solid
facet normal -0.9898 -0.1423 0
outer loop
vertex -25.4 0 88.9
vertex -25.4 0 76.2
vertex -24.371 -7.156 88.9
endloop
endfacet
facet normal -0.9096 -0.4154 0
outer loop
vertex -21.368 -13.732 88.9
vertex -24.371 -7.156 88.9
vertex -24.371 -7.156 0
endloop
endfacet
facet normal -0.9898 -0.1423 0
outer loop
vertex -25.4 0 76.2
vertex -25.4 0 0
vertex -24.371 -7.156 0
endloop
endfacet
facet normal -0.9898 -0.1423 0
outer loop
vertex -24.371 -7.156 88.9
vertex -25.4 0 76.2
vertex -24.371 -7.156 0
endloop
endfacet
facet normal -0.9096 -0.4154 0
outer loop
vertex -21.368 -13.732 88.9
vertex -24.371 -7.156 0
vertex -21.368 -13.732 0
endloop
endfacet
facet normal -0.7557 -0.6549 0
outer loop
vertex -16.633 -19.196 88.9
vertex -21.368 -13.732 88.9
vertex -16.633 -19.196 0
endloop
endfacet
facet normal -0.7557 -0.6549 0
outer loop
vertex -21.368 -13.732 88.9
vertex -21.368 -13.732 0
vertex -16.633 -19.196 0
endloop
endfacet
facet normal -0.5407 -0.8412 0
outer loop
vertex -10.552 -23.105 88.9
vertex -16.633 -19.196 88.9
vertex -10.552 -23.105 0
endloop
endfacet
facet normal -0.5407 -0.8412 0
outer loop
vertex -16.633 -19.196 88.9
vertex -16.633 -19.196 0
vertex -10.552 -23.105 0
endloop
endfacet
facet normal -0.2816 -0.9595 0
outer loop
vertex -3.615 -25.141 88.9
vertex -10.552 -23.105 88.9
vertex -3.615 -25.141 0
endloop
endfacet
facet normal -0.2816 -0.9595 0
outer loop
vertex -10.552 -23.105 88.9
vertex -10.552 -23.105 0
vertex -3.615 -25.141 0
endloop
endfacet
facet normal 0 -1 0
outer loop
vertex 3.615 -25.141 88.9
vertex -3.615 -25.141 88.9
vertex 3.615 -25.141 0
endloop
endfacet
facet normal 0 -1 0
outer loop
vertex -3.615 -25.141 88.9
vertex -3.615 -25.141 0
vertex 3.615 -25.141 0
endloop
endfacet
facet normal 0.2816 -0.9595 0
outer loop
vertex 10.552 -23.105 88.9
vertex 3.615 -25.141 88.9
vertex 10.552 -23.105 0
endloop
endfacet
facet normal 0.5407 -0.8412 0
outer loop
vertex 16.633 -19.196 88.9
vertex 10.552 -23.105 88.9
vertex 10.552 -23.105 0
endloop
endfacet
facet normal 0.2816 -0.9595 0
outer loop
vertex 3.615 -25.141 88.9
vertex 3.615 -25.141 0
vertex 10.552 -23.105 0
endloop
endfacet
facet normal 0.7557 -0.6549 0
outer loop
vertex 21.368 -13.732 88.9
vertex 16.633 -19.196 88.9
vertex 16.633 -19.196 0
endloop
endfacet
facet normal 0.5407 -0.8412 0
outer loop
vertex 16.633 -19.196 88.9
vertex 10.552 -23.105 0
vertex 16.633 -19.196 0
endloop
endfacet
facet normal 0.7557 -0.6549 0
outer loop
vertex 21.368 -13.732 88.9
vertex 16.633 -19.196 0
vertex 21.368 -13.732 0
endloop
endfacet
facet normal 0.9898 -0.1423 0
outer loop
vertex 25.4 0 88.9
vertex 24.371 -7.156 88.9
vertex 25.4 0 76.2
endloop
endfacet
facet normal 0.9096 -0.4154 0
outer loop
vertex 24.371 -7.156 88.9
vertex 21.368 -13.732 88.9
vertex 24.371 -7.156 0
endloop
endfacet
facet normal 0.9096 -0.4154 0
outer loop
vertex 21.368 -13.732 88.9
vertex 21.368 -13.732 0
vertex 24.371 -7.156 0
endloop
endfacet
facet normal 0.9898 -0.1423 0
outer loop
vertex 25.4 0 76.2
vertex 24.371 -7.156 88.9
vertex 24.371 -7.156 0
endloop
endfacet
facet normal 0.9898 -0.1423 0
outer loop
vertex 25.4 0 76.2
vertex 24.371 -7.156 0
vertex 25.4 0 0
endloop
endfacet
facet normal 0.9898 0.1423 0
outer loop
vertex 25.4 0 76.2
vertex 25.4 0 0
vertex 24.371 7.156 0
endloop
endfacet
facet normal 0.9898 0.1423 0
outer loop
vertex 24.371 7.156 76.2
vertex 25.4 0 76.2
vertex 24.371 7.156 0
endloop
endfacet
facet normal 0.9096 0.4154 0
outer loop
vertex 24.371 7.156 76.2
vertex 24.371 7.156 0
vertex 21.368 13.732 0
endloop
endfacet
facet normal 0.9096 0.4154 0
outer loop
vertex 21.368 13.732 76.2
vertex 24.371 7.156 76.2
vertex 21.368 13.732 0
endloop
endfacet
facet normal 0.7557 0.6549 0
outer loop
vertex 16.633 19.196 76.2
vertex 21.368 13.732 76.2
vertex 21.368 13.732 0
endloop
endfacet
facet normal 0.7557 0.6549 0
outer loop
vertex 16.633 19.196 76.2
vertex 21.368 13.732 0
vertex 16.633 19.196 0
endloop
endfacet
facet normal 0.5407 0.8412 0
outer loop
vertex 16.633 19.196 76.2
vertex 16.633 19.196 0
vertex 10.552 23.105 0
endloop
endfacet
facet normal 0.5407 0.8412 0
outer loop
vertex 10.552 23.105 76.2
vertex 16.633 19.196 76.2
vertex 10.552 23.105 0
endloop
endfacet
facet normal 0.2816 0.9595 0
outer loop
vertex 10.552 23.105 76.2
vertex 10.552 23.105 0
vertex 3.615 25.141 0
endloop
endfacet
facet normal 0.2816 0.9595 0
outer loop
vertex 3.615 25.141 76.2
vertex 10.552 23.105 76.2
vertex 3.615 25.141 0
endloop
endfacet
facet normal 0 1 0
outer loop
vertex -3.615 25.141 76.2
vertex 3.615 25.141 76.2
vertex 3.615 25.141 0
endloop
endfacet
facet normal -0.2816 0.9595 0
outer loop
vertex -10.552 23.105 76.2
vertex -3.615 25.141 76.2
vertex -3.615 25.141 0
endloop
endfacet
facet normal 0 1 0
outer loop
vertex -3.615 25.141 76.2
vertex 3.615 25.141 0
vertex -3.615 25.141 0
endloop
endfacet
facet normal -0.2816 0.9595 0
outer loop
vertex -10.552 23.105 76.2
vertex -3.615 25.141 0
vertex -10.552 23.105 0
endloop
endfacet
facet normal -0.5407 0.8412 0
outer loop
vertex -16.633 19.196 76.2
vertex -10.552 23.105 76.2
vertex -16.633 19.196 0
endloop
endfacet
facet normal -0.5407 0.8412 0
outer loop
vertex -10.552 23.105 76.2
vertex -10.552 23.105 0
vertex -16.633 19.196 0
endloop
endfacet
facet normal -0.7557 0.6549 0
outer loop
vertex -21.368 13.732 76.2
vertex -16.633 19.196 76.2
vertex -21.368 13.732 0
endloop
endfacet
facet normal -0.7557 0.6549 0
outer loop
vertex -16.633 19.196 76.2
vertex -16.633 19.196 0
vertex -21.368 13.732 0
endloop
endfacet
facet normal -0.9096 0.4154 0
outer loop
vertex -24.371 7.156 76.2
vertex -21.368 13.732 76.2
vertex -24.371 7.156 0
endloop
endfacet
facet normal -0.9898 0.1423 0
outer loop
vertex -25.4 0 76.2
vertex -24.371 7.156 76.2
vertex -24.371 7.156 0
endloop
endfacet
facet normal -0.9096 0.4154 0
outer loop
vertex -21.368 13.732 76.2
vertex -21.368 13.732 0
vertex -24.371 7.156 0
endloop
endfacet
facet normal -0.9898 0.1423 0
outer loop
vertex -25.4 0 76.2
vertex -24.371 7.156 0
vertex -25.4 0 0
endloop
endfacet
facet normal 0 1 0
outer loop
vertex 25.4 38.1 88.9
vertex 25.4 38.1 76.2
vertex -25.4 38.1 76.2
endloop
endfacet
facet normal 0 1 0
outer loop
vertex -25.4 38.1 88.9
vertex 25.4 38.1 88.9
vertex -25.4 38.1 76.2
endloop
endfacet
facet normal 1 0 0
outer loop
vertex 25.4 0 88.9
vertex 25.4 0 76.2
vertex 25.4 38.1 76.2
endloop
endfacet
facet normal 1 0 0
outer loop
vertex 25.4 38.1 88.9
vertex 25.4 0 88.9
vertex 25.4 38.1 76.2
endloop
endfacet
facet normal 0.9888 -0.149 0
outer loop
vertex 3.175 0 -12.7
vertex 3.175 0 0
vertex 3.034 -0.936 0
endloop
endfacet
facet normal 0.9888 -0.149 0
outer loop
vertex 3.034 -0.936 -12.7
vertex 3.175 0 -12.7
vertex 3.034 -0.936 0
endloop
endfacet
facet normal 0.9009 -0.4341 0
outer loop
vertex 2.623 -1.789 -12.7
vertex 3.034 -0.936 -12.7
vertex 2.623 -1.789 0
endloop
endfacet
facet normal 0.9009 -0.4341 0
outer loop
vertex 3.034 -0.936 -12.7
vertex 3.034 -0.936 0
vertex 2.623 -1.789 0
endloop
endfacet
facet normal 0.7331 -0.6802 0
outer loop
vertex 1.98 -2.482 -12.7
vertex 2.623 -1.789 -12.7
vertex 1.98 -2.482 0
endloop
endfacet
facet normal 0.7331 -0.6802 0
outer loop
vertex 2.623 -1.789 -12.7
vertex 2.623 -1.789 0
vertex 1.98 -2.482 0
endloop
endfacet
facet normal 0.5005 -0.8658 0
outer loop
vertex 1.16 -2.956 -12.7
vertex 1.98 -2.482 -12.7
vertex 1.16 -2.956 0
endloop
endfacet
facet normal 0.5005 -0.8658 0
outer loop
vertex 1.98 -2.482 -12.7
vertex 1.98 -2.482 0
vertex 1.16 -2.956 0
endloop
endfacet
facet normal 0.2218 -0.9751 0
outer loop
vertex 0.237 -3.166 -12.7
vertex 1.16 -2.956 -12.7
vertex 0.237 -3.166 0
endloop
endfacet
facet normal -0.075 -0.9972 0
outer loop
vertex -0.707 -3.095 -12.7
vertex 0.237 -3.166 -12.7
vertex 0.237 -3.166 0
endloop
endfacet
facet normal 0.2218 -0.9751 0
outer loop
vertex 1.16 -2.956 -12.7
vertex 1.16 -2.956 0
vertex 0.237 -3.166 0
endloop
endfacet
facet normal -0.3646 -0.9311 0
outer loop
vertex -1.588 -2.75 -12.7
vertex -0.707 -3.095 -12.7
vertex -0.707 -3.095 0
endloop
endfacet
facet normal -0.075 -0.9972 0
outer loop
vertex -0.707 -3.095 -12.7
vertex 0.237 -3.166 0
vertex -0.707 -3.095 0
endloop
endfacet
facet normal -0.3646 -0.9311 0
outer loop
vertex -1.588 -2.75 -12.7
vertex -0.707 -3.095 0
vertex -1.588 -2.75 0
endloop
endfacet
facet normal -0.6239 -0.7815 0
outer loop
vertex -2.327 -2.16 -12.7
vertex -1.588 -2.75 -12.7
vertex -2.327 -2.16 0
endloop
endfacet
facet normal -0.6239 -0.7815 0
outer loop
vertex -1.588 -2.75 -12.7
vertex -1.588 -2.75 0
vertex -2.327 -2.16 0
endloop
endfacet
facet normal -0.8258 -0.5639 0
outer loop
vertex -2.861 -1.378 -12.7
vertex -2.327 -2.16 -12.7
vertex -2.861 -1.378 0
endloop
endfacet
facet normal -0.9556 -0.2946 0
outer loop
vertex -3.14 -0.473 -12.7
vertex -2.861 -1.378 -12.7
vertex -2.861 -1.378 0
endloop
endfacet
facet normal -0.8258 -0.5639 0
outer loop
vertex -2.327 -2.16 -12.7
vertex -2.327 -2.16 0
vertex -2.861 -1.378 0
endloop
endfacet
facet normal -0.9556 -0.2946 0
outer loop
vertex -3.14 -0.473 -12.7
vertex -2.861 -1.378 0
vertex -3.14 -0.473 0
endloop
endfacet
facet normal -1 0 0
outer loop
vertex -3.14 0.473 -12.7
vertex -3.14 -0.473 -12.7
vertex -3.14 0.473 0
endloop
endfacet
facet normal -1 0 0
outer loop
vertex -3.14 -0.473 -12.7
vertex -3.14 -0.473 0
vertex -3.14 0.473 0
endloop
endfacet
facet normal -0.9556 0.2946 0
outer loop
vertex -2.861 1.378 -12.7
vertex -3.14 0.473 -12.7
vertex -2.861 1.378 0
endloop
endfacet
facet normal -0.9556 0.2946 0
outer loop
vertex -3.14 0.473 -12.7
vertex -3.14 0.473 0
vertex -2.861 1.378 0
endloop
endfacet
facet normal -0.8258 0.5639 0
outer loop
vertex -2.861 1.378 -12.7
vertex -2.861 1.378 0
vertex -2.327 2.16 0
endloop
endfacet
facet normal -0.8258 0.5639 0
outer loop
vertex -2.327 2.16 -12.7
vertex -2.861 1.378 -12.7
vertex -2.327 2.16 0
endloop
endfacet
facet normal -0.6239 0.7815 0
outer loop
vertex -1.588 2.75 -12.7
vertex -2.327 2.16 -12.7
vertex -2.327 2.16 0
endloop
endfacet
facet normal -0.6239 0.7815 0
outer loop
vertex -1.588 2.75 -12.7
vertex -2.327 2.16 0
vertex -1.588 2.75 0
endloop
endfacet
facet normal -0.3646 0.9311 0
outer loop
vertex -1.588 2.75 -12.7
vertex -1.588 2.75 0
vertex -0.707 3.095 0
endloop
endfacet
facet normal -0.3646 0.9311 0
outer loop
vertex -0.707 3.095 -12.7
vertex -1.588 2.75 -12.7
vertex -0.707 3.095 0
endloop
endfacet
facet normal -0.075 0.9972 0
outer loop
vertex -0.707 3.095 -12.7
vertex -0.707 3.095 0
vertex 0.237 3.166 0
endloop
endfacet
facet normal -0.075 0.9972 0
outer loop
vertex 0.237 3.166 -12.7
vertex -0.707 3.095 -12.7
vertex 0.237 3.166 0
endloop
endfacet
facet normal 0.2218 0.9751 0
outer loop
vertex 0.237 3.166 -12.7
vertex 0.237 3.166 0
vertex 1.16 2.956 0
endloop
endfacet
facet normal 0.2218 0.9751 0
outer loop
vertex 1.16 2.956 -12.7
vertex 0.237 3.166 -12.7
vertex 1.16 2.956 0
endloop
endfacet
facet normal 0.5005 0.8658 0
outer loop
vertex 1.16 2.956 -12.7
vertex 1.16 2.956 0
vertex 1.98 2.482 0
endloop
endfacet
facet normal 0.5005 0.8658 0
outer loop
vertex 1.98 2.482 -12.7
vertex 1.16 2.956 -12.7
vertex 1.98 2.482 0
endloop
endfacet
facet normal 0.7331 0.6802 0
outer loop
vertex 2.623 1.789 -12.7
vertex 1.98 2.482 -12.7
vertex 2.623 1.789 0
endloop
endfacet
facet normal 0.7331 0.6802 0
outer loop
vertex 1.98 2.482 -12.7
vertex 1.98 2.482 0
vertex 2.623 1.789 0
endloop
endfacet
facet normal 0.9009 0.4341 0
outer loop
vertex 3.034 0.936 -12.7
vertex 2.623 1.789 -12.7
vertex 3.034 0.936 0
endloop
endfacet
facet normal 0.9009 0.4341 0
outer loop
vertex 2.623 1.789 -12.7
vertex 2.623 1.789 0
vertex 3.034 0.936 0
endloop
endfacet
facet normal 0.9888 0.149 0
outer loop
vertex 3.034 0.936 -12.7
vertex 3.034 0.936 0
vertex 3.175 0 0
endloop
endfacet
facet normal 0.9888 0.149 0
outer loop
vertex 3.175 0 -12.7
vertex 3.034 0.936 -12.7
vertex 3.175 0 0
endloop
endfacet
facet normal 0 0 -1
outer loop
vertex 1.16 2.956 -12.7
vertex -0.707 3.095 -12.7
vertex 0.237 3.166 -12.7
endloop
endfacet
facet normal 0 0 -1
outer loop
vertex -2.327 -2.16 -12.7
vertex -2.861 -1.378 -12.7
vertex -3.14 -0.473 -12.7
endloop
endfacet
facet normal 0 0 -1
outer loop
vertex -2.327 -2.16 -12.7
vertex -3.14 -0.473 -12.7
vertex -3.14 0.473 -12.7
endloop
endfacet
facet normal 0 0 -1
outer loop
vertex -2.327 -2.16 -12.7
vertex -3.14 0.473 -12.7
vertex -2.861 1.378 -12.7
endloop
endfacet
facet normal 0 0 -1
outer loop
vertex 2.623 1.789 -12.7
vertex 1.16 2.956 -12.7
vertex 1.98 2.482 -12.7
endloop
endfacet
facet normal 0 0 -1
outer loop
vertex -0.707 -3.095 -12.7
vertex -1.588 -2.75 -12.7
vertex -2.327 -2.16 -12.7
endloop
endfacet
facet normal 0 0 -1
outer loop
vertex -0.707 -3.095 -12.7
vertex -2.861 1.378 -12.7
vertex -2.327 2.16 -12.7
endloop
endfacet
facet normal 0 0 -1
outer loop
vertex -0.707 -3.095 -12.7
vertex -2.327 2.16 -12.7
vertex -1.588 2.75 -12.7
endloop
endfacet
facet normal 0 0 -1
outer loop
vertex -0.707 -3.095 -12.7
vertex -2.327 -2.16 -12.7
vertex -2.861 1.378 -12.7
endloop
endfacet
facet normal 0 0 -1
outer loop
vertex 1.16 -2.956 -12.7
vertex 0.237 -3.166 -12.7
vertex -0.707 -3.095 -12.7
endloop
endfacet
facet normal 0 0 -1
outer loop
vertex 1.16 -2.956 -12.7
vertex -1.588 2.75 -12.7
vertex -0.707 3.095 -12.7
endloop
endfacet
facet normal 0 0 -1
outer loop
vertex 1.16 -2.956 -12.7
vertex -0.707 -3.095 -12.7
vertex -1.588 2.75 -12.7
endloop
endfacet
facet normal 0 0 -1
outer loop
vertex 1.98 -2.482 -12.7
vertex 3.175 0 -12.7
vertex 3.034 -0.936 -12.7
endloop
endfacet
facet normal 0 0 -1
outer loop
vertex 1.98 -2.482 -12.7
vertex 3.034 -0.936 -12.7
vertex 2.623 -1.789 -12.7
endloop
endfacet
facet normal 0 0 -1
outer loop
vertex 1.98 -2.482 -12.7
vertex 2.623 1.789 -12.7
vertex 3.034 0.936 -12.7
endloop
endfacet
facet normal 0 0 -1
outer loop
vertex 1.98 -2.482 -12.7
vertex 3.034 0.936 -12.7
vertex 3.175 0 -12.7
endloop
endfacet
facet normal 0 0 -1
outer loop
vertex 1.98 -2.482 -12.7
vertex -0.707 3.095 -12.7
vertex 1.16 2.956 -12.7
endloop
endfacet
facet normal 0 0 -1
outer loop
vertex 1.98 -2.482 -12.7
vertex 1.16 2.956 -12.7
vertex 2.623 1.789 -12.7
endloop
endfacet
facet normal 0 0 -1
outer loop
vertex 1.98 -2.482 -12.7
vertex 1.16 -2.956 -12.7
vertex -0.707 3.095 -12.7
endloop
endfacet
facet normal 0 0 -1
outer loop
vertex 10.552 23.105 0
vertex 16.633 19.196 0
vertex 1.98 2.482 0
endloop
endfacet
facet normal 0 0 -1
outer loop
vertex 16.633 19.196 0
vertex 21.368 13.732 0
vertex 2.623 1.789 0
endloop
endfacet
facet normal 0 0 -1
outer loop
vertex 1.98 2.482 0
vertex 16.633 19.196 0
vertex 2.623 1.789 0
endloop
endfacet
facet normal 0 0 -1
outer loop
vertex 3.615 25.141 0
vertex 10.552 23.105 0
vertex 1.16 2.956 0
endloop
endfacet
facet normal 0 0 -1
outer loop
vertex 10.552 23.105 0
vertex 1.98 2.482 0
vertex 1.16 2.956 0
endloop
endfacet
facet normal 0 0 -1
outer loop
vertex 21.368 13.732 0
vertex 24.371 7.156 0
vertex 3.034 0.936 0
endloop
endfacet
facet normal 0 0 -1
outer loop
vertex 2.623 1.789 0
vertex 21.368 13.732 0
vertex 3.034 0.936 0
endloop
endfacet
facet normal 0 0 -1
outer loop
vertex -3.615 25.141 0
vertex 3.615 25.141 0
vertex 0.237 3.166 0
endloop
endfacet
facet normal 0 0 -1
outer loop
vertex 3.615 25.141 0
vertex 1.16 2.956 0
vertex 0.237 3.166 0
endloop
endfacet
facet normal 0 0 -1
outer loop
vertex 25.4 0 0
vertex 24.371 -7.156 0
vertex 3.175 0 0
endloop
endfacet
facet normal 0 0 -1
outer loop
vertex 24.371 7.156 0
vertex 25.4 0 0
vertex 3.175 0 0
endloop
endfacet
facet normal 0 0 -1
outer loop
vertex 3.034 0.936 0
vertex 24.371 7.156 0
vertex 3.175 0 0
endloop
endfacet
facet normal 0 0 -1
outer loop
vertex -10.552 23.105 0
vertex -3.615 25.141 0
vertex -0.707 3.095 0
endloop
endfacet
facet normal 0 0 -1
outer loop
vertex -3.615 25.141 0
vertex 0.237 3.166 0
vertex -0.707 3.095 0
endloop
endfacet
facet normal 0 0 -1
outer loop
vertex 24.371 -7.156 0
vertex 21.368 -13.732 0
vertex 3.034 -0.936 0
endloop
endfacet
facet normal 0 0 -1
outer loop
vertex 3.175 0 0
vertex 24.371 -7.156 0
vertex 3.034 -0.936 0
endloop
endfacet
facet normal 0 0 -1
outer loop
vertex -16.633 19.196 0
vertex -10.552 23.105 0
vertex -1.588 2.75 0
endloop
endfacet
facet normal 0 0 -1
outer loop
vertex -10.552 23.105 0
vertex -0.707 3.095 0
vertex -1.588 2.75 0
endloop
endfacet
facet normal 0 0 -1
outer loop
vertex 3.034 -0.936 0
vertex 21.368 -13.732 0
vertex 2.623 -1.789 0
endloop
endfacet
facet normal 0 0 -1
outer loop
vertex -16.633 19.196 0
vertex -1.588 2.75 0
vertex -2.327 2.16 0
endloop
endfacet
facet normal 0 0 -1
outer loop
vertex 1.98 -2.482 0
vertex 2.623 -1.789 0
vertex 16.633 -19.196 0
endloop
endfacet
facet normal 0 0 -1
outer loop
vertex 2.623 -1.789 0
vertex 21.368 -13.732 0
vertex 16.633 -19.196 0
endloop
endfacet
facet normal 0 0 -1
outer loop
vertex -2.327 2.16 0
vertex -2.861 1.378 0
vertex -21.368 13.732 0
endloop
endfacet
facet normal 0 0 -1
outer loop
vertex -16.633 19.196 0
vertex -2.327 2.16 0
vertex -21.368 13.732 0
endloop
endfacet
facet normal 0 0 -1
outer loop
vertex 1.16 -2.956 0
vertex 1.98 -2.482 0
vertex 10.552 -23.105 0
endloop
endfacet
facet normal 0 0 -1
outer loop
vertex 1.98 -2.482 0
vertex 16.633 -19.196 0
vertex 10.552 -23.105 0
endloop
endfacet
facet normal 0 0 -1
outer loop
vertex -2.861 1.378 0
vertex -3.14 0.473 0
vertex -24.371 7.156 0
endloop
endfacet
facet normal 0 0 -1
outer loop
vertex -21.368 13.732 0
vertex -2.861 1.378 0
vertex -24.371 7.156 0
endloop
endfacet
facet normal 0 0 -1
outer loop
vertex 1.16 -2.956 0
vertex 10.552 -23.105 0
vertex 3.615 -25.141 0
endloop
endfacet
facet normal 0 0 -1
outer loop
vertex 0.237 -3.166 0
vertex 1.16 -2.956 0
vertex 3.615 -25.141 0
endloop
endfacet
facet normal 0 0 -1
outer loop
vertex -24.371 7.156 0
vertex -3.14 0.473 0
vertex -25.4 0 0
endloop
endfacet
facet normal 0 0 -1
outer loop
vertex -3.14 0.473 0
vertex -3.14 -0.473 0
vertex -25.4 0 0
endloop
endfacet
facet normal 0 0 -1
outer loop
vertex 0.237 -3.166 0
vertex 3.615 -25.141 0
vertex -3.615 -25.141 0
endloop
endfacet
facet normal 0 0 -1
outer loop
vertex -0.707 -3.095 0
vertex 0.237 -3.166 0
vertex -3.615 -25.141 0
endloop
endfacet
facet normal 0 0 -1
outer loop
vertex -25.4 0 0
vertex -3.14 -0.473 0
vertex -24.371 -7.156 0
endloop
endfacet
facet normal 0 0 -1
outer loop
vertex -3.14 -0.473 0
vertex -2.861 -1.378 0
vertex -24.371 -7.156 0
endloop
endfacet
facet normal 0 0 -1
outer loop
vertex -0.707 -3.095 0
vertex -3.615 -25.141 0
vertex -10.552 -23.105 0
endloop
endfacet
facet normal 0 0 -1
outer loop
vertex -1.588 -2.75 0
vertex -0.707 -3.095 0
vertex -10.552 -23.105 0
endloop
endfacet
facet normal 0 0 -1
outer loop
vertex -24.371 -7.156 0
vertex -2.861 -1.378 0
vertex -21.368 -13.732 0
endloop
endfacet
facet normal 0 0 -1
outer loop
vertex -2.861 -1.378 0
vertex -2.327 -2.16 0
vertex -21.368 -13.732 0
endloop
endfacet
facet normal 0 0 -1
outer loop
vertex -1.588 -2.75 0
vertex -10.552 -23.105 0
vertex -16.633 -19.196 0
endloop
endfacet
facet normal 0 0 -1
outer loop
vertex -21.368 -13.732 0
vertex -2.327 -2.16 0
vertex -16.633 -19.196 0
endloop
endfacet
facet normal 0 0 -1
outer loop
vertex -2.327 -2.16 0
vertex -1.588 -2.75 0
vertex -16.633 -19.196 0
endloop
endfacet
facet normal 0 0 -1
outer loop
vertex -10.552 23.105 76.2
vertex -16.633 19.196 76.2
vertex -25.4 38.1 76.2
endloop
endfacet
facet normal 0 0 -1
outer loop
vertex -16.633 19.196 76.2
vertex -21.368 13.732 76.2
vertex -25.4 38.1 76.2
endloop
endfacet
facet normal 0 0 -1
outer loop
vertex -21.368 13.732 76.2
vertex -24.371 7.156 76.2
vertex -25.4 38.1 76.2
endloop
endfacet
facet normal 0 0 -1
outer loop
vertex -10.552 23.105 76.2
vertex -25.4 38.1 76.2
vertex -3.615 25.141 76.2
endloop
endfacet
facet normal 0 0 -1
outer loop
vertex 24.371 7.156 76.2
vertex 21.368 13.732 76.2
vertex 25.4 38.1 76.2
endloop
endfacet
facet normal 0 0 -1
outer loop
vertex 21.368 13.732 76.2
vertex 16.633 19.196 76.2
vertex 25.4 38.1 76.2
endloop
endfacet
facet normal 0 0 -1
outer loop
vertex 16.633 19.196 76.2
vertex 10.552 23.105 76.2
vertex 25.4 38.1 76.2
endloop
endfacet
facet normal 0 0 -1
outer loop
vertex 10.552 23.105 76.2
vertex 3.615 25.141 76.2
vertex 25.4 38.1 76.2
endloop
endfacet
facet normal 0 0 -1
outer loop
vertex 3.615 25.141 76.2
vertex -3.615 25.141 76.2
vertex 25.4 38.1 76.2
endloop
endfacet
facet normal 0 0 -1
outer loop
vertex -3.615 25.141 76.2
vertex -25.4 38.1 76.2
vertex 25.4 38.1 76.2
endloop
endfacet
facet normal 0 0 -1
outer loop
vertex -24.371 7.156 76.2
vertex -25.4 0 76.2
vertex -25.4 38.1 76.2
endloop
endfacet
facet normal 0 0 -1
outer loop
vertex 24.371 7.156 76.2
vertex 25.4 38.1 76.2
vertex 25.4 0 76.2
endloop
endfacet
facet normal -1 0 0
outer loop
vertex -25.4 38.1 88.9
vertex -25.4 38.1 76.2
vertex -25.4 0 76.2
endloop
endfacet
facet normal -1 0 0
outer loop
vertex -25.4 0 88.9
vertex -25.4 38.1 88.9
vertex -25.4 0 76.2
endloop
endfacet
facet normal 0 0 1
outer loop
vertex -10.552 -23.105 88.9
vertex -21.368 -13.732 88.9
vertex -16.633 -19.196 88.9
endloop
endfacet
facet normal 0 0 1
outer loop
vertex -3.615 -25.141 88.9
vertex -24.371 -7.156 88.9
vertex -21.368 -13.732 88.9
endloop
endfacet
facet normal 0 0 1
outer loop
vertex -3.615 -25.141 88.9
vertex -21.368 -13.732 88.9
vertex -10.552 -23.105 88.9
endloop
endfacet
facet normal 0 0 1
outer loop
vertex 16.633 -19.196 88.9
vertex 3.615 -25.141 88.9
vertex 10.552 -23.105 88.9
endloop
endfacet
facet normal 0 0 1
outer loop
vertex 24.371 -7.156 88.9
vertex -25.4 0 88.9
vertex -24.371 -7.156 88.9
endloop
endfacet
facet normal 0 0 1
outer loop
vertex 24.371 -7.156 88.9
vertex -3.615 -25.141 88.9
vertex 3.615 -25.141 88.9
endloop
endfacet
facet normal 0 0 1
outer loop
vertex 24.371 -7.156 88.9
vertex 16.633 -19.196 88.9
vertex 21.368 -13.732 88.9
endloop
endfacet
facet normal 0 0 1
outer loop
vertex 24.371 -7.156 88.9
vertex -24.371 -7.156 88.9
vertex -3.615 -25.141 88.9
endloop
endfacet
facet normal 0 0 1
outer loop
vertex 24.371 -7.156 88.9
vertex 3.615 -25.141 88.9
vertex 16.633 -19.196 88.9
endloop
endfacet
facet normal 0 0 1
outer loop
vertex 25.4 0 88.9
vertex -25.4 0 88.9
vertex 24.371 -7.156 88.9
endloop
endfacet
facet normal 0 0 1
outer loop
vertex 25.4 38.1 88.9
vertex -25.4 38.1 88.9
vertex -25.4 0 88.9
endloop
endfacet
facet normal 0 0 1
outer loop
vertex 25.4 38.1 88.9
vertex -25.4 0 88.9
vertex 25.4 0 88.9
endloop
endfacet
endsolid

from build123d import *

# Parameters (mm, degrees)
SKETCH1_R           = 25.4
BOSS_EXTRUDE1_DEPTH = 76.2
BOSS_EXTRUDE2_DEPTH = 12.7
SKETCH3_R           = 3.175
BOSS_EXTRUDE3_DEPTH = 12.7


with BuildPart() as part:
    # Sketch1 → Boss-Extrude1 (new body)
    with BuildSketch(Plane.XY):
        with Locations(Location((0, 0, 0), (0, 0, 180))):
            Circle(SKETCH1_R)
    extrude(amount=BOSS_EXTRUDE1_DEPTH)

    # Sketch2 → Boss-Extrude2 (add)
    with BuildSketch(Plane.XY.offset(76.2)):
        with BuildLine():
            ThreePointArc((25.4, 0), (0, 25.4), (-25.4, 0))
            Line((-25.4, 0), (25.4, 0))
        make_face()
        with BuildLine():
            Line((25.4, 0), (-25.4, 0))
            ThreePointArc((-25.4, 0), (0, -25.4), (25.4, 0))
        make_face()
        with BuildLine():
            Line((-25.4, 38.1), (-25.4, 0))
            ThreePointArc((-25.4, 0), (0, 25.4), (25.4, 0))
            Line((25.4, 0), (25.4, 38.1))
            Line((25.4, 38.1), (-25.4, 38.1))
        make_face()
    extrude(amount=BOSS_EXTRUDE2_DEPTH)

    # Sketch3 → Boss-Extrude3 (add)
    with BuildSketch(Plane(origin=(0, 0, 0), x_dir=(-1, 0, 0), z_dir=(0, 0, -1))):
        with Locations(Location((0, 0, 0), (0, 0, 180))):
            Circle(SKETCH3_R)
    extrude(amount=BOSS_EXTRUDE3_DEPTH)


solid = part.part
